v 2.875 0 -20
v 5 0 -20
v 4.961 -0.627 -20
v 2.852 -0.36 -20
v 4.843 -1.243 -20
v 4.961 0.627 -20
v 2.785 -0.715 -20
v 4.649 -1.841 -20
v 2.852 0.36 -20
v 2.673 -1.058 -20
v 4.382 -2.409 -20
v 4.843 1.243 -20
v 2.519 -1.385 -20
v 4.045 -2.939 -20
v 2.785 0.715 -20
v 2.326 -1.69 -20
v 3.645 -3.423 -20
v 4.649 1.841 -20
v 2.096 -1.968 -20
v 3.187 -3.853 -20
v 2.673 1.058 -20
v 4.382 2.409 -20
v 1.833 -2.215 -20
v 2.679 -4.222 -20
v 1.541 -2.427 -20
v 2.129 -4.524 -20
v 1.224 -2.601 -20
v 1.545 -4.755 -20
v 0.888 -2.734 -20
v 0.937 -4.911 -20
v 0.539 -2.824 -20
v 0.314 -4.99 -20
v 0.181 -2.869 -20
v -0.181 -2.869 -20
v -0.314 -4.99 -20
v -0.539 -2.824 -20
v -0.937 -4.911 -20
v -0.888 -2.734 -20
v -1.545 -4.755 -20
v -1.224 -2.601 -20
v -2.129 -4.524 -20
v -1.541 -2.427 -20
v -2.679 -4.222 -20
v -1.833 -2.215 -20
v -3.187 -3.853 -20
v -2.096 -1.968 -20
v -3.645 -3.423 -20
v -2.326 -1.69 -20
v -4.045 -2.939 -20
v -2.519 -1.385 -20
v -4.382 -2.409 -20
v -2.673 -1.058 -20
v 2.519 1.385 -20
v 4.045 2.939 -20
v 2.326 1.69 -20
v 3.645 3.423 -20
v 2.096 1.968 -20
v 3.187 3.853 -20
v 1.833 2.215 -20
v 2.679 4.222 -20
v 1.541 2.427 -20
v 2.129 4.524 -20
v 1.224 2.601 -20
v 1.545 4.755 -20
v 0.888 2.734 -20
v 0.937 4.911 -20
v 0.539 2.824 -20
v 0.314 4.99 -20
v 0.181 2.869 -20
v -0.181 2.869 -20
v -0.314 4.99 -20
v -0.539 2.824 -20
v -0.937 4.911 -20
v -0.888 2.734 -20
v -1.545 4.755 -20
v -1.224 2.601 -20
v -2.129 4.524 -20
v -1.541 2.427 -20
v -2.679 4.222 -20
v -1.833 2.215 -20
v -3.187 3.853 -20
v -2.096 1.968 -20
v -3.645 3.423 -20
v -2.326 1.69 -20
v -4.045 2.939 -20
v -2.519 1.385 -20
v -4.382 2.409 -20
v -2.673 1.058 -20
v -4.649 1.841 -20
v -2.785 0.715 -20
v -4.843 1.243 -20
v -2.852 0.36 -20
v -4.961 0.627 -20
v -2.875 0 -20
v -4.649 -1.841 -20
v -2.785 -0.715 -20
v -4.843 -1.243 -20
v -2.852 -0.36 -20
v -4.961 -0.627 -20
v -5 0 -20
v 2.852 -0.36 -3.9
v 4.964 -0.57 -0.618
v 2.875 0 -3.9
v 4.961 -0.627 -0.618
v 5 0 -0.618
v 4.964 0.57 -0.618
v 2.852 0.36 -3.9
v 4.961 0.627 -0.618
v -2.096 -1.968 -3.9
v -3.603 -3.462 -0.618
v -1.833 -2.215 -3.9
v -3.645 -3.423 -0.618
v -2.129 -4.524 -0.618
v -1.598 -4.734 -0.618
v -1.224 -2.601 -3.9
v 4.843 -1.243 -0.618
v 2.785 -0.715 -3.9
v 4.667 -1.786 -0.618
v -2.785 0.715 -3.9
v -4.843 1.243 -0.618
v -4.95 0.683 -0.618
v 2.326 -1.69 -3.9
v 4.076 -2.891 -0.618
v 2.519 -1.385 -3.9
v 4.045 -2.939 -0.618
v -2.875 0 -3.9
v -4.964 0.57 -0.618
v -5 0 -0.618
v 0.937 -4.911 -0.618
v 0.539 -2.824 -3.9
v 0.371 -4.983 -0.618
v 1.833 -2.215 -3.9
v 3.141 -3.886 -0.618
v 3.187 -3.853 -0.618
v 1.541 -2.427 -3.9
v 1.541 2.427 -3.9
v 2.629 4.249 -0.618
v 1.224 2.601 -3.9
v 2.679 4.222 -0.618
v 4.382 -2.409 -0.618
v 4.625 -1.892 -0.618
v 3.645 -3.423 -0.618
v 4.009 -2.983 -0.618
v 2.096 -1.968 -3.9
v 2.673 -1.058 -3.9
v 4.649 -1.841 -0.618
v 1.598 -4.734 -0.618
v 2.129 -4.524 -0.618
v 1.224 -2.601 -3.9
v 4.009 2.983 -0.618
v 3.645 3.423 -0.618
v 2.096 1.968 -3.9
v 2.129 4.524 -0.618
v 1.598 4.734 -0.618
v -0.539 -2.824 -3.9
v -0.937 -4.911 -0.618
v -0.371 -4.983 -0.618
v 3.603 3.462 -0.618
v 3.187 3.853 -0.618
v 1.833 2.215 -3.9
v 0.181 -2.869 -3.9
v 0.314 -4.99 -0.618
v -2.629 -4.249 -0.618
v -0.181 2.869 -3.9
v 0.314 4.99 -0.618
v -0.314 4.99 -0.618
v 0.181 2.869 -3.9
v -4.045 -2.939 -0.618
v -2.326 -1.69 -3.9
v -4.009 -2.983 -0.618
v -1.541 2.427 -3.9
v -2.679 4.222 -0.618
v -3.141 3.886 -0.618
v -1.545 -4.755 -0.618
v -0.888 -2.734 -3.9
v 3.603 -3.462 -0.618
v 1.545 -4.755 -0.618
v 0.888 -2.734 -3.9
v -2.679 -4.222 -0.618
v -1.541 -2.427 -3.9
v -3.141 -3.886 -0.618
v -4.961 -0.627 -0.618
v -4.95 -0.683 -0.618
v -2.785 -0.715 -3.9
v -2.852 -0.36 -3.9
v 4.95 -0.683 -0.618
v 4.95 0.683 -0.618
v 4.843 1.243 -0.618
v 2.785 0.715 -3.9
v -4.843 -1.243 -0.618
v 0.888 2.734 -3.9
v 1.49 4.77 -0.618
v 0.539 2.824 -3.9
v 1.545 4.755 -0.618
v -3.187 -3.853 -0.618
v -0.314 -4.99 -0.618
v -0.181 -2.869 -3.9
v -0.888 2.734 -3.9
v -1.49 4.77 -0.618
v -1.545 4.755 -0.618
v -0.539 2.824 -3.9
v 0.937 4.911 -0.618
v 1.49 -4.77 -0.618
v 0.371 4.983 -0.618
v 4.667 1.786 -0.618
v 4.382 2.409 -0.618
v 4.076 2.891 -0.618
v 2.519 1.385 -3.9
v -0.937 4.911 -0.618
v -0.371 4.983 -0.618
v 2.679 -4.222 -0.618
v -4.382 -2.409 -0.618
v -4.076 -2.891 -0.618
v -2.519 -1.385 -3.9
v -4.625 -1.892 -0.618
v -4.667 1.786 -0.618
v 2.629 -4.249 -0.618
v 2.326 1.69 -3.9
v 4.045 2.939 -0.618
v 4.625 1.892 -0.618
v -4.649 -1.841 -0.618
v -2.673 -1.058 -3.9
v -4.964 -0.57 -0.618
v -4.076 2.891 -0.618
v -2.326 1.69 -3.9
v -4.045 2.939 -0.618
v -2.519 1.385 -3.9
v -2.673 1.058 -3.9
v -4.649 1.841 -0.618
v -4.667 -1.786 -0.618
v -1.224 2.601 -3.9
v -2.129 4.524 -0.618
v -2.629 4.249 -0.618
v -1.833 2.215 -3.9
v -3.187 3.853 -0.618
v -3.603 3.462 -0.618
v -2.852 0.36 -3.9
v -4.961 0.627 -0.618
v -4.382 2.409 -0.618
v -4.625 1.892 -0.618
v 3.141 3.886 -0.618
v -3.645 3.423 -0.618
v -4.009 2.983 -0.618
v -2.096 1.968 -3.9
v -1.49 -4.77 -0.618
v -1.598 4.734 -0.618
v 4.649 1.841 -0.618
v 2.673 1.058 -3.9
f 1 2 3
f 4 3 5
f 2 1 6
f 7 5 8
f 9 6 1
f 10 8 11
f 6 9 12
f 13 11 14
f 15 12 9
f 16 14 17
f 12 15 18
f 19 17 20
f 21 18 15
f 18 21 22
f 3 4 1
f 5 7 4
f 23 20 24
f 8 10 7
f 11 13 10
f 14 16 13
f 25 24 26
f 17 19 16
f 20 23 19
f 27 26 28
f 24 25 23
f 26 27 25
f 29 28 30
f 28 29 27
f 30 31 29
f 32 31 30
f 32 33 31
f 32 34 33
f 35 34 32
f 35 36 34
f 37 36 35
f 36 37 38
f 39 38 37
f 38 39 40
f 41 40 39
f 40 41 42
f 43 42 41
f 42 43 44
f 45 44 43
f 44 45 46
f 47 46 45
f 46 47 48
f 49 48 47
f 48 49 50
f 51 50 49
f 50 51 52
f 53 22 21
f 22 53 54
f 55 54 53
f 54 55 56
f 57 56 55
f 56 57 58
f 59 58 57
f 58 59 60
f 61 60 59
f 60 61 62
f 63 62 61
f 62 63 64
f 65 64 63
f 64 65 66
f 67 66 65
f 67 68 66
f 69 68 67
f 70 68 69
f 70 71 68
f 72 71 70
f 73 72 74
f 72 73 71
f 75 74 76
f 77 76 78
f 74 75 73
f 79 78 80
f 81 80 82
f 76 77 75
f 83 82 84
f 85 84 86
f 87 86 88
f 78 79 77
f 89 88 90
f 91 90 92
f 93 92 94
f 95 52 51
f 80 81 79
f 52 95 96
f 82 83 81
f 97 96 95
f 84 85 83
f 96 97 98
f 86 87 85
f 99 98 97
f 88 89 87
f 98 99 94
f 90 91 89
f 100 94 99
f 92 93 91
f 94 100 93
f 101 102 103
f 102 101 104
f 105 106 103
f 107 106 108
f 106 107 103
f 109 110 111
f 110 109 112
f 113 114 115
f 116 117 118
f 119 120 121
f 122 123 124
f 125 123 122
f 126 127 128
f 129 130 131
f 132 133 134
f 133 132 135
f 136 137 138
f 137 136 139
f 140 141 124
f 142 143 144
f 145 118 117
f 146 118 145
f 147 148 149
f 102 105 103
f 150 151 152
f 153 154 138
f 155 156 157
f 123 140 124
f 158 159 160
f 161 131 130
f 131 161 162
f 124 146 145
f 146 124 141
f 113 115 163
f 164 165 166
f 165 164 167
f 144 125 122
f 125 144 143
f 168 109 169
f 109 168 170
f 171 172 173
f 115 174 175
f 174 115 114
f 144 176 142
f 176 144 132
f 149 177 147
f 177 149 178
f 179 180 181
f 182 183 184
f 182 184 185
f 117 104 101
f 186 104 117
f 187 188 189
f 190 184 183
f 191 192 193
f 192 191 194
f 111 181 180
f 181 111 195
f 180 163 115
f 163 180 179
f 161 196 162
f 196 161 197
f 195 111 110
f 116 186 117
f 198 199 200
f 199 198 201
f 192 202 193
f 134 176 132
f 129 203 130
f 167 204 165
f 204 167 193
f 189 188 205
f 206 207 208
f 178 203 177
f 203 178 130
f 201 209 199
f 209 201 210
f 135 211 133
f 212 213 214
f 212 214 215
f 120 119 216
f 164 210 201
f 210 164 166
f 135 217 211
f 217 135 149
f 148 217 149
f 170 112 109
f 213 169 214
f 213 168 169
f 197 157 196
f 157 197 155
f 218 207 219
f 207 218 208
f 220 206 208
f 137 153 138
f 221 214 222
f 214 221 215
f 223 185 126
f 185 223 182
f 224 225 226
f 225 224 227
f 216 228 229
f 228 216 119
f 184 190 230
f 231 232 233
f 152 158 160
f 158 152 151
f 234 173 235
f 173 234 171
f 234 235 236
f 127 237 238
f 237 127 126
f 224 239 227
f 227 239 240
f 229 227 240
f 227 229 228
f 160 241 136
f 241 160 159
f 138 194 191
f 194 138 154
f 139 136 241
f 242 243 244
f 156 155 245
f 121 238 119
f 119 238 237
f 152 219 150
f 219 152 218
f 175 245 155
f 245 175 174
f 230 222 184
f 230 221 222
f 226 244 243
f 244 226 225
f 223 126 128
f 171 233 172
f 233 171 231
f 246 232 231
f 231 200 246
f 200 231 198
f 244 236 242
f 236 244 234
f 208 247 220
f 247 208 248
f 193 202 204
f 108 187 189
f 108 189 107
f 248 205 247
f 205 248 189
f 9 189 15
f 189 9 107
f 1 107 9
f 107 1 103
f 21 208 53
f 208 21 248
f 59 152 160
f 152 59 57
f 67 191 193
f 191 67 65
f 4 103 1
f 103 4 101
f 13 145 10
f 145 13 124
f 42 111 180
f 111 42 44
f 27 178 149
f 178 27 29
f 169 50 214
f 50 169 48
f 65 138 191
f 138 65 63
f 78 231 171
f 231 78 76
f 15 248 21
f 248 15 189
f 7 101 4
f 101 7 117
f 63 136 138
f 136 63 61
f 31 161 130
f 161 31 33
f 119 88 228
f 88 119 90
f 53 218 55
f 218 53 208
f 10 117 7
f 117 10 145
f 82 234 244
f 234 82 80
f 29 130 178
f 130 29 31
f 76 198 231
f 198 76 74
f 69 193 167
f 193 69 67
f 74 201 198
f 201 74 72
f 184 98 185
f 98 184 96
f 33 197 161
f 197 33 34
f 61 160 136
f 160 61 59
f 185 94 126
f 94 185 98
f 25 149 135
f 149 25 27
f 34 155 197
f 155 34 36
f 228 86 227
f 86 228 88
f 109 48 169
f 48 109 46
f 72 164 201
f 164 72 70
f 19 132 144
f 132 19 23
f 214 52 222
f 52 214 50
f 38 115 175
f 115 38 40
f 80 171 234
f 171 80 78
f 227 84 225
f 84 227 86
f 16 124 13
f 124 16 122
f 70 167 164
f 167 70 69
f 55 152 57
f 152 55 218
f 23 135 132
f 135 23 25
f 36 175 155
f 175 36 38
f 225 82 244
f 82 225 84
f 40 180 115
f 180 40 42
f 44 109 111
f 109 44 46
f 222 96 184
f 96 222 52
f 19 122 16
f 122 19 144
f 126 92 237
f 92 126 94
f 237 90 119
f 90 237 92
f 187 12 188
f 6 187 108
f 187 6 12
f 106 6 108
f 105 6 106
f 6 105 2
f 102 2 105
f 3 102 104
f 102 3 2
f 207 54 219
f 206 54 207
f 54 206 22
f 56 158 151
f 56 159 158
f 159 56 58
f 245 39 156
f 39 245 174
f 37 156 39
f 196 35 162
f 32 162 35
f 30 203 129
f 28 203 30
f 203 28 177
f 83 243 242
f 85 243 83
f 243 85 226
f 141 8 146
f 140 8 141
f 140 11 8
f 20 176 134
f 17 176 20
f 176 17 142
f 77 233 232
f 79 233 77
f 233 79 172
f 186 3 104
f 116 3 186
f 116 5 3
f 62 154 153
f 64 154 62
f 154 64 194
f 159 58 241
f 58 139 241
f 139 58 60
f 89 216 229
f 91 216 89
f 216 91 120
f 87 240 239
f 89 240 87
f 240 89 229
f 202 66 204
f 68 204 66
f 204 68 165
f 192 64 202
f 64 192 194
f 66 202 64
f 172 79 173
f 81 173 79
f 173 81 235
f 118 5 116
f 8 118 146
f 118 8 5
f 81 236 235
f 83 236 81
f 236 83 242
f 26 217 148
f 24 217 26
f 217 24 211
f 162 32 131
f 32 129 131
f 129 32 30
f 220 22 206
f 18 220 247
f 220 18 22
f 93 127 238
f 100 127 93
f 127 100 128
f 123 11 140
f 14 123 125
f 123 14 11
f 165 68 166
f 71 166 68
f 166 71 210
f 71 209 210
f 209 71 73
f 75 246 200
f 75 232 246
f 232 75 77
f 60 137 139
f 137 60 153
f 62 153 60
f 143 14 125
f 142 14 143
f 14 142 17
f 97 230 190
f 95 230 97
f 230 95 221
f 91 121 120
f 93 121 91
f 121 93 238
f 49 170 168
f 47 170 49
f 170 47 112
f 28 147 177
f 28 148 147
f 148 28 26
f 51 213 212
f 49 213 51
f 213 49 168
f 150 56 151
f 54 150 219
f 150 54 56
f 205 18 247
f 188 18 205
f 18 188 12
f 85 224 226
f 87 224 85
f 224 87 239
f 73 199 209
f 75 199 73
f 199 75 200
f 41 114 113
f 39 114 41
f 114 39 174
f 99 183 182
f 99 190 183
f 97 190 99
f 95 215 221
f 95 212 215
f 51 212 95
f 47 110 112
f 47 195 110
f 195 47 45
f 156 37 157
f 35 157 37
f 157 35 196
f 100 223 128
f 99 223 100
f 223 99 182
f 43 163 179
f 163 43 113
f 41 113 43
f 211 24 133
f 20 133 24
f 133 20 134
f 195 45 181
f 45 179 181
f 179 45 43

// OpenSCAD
$fn = 50;


difference() {
	union() {
		translate(v = [0, 0, -20.0000000000]) {
			cylinder(h = 20, r = 5.0000000000);
		}
		cylinder(h = 0, r = 8.0000000000);
	}
	union() {
		translate(v = [0, 0, 0]) {
			rotate(a = [0, 0, 0]) {
				difference() {
					union() {
						#translate(v = [0, 0, -20.0000000000]) {
							cylinder(h = 20, r = 2.6000000000);
						}
						#translate(v = [0, 0, -3.9000000000]) {
							cylinder(h = 3.9000000000, r = 5.0000000000, r1 = 2.8750000000, r2 = 5.4000000000);
						}
						#translate(v = [0, 0, -20.0000000000]) {
							cylinder(h = 20, r = 2.8750000000);
						}
						#translate(v = [0, 0, -20.0000000000]) {
							cylinder(h = 20, r = 2.6000000000);
						}
					}
					union();
				}
			}
		}
	}
}
